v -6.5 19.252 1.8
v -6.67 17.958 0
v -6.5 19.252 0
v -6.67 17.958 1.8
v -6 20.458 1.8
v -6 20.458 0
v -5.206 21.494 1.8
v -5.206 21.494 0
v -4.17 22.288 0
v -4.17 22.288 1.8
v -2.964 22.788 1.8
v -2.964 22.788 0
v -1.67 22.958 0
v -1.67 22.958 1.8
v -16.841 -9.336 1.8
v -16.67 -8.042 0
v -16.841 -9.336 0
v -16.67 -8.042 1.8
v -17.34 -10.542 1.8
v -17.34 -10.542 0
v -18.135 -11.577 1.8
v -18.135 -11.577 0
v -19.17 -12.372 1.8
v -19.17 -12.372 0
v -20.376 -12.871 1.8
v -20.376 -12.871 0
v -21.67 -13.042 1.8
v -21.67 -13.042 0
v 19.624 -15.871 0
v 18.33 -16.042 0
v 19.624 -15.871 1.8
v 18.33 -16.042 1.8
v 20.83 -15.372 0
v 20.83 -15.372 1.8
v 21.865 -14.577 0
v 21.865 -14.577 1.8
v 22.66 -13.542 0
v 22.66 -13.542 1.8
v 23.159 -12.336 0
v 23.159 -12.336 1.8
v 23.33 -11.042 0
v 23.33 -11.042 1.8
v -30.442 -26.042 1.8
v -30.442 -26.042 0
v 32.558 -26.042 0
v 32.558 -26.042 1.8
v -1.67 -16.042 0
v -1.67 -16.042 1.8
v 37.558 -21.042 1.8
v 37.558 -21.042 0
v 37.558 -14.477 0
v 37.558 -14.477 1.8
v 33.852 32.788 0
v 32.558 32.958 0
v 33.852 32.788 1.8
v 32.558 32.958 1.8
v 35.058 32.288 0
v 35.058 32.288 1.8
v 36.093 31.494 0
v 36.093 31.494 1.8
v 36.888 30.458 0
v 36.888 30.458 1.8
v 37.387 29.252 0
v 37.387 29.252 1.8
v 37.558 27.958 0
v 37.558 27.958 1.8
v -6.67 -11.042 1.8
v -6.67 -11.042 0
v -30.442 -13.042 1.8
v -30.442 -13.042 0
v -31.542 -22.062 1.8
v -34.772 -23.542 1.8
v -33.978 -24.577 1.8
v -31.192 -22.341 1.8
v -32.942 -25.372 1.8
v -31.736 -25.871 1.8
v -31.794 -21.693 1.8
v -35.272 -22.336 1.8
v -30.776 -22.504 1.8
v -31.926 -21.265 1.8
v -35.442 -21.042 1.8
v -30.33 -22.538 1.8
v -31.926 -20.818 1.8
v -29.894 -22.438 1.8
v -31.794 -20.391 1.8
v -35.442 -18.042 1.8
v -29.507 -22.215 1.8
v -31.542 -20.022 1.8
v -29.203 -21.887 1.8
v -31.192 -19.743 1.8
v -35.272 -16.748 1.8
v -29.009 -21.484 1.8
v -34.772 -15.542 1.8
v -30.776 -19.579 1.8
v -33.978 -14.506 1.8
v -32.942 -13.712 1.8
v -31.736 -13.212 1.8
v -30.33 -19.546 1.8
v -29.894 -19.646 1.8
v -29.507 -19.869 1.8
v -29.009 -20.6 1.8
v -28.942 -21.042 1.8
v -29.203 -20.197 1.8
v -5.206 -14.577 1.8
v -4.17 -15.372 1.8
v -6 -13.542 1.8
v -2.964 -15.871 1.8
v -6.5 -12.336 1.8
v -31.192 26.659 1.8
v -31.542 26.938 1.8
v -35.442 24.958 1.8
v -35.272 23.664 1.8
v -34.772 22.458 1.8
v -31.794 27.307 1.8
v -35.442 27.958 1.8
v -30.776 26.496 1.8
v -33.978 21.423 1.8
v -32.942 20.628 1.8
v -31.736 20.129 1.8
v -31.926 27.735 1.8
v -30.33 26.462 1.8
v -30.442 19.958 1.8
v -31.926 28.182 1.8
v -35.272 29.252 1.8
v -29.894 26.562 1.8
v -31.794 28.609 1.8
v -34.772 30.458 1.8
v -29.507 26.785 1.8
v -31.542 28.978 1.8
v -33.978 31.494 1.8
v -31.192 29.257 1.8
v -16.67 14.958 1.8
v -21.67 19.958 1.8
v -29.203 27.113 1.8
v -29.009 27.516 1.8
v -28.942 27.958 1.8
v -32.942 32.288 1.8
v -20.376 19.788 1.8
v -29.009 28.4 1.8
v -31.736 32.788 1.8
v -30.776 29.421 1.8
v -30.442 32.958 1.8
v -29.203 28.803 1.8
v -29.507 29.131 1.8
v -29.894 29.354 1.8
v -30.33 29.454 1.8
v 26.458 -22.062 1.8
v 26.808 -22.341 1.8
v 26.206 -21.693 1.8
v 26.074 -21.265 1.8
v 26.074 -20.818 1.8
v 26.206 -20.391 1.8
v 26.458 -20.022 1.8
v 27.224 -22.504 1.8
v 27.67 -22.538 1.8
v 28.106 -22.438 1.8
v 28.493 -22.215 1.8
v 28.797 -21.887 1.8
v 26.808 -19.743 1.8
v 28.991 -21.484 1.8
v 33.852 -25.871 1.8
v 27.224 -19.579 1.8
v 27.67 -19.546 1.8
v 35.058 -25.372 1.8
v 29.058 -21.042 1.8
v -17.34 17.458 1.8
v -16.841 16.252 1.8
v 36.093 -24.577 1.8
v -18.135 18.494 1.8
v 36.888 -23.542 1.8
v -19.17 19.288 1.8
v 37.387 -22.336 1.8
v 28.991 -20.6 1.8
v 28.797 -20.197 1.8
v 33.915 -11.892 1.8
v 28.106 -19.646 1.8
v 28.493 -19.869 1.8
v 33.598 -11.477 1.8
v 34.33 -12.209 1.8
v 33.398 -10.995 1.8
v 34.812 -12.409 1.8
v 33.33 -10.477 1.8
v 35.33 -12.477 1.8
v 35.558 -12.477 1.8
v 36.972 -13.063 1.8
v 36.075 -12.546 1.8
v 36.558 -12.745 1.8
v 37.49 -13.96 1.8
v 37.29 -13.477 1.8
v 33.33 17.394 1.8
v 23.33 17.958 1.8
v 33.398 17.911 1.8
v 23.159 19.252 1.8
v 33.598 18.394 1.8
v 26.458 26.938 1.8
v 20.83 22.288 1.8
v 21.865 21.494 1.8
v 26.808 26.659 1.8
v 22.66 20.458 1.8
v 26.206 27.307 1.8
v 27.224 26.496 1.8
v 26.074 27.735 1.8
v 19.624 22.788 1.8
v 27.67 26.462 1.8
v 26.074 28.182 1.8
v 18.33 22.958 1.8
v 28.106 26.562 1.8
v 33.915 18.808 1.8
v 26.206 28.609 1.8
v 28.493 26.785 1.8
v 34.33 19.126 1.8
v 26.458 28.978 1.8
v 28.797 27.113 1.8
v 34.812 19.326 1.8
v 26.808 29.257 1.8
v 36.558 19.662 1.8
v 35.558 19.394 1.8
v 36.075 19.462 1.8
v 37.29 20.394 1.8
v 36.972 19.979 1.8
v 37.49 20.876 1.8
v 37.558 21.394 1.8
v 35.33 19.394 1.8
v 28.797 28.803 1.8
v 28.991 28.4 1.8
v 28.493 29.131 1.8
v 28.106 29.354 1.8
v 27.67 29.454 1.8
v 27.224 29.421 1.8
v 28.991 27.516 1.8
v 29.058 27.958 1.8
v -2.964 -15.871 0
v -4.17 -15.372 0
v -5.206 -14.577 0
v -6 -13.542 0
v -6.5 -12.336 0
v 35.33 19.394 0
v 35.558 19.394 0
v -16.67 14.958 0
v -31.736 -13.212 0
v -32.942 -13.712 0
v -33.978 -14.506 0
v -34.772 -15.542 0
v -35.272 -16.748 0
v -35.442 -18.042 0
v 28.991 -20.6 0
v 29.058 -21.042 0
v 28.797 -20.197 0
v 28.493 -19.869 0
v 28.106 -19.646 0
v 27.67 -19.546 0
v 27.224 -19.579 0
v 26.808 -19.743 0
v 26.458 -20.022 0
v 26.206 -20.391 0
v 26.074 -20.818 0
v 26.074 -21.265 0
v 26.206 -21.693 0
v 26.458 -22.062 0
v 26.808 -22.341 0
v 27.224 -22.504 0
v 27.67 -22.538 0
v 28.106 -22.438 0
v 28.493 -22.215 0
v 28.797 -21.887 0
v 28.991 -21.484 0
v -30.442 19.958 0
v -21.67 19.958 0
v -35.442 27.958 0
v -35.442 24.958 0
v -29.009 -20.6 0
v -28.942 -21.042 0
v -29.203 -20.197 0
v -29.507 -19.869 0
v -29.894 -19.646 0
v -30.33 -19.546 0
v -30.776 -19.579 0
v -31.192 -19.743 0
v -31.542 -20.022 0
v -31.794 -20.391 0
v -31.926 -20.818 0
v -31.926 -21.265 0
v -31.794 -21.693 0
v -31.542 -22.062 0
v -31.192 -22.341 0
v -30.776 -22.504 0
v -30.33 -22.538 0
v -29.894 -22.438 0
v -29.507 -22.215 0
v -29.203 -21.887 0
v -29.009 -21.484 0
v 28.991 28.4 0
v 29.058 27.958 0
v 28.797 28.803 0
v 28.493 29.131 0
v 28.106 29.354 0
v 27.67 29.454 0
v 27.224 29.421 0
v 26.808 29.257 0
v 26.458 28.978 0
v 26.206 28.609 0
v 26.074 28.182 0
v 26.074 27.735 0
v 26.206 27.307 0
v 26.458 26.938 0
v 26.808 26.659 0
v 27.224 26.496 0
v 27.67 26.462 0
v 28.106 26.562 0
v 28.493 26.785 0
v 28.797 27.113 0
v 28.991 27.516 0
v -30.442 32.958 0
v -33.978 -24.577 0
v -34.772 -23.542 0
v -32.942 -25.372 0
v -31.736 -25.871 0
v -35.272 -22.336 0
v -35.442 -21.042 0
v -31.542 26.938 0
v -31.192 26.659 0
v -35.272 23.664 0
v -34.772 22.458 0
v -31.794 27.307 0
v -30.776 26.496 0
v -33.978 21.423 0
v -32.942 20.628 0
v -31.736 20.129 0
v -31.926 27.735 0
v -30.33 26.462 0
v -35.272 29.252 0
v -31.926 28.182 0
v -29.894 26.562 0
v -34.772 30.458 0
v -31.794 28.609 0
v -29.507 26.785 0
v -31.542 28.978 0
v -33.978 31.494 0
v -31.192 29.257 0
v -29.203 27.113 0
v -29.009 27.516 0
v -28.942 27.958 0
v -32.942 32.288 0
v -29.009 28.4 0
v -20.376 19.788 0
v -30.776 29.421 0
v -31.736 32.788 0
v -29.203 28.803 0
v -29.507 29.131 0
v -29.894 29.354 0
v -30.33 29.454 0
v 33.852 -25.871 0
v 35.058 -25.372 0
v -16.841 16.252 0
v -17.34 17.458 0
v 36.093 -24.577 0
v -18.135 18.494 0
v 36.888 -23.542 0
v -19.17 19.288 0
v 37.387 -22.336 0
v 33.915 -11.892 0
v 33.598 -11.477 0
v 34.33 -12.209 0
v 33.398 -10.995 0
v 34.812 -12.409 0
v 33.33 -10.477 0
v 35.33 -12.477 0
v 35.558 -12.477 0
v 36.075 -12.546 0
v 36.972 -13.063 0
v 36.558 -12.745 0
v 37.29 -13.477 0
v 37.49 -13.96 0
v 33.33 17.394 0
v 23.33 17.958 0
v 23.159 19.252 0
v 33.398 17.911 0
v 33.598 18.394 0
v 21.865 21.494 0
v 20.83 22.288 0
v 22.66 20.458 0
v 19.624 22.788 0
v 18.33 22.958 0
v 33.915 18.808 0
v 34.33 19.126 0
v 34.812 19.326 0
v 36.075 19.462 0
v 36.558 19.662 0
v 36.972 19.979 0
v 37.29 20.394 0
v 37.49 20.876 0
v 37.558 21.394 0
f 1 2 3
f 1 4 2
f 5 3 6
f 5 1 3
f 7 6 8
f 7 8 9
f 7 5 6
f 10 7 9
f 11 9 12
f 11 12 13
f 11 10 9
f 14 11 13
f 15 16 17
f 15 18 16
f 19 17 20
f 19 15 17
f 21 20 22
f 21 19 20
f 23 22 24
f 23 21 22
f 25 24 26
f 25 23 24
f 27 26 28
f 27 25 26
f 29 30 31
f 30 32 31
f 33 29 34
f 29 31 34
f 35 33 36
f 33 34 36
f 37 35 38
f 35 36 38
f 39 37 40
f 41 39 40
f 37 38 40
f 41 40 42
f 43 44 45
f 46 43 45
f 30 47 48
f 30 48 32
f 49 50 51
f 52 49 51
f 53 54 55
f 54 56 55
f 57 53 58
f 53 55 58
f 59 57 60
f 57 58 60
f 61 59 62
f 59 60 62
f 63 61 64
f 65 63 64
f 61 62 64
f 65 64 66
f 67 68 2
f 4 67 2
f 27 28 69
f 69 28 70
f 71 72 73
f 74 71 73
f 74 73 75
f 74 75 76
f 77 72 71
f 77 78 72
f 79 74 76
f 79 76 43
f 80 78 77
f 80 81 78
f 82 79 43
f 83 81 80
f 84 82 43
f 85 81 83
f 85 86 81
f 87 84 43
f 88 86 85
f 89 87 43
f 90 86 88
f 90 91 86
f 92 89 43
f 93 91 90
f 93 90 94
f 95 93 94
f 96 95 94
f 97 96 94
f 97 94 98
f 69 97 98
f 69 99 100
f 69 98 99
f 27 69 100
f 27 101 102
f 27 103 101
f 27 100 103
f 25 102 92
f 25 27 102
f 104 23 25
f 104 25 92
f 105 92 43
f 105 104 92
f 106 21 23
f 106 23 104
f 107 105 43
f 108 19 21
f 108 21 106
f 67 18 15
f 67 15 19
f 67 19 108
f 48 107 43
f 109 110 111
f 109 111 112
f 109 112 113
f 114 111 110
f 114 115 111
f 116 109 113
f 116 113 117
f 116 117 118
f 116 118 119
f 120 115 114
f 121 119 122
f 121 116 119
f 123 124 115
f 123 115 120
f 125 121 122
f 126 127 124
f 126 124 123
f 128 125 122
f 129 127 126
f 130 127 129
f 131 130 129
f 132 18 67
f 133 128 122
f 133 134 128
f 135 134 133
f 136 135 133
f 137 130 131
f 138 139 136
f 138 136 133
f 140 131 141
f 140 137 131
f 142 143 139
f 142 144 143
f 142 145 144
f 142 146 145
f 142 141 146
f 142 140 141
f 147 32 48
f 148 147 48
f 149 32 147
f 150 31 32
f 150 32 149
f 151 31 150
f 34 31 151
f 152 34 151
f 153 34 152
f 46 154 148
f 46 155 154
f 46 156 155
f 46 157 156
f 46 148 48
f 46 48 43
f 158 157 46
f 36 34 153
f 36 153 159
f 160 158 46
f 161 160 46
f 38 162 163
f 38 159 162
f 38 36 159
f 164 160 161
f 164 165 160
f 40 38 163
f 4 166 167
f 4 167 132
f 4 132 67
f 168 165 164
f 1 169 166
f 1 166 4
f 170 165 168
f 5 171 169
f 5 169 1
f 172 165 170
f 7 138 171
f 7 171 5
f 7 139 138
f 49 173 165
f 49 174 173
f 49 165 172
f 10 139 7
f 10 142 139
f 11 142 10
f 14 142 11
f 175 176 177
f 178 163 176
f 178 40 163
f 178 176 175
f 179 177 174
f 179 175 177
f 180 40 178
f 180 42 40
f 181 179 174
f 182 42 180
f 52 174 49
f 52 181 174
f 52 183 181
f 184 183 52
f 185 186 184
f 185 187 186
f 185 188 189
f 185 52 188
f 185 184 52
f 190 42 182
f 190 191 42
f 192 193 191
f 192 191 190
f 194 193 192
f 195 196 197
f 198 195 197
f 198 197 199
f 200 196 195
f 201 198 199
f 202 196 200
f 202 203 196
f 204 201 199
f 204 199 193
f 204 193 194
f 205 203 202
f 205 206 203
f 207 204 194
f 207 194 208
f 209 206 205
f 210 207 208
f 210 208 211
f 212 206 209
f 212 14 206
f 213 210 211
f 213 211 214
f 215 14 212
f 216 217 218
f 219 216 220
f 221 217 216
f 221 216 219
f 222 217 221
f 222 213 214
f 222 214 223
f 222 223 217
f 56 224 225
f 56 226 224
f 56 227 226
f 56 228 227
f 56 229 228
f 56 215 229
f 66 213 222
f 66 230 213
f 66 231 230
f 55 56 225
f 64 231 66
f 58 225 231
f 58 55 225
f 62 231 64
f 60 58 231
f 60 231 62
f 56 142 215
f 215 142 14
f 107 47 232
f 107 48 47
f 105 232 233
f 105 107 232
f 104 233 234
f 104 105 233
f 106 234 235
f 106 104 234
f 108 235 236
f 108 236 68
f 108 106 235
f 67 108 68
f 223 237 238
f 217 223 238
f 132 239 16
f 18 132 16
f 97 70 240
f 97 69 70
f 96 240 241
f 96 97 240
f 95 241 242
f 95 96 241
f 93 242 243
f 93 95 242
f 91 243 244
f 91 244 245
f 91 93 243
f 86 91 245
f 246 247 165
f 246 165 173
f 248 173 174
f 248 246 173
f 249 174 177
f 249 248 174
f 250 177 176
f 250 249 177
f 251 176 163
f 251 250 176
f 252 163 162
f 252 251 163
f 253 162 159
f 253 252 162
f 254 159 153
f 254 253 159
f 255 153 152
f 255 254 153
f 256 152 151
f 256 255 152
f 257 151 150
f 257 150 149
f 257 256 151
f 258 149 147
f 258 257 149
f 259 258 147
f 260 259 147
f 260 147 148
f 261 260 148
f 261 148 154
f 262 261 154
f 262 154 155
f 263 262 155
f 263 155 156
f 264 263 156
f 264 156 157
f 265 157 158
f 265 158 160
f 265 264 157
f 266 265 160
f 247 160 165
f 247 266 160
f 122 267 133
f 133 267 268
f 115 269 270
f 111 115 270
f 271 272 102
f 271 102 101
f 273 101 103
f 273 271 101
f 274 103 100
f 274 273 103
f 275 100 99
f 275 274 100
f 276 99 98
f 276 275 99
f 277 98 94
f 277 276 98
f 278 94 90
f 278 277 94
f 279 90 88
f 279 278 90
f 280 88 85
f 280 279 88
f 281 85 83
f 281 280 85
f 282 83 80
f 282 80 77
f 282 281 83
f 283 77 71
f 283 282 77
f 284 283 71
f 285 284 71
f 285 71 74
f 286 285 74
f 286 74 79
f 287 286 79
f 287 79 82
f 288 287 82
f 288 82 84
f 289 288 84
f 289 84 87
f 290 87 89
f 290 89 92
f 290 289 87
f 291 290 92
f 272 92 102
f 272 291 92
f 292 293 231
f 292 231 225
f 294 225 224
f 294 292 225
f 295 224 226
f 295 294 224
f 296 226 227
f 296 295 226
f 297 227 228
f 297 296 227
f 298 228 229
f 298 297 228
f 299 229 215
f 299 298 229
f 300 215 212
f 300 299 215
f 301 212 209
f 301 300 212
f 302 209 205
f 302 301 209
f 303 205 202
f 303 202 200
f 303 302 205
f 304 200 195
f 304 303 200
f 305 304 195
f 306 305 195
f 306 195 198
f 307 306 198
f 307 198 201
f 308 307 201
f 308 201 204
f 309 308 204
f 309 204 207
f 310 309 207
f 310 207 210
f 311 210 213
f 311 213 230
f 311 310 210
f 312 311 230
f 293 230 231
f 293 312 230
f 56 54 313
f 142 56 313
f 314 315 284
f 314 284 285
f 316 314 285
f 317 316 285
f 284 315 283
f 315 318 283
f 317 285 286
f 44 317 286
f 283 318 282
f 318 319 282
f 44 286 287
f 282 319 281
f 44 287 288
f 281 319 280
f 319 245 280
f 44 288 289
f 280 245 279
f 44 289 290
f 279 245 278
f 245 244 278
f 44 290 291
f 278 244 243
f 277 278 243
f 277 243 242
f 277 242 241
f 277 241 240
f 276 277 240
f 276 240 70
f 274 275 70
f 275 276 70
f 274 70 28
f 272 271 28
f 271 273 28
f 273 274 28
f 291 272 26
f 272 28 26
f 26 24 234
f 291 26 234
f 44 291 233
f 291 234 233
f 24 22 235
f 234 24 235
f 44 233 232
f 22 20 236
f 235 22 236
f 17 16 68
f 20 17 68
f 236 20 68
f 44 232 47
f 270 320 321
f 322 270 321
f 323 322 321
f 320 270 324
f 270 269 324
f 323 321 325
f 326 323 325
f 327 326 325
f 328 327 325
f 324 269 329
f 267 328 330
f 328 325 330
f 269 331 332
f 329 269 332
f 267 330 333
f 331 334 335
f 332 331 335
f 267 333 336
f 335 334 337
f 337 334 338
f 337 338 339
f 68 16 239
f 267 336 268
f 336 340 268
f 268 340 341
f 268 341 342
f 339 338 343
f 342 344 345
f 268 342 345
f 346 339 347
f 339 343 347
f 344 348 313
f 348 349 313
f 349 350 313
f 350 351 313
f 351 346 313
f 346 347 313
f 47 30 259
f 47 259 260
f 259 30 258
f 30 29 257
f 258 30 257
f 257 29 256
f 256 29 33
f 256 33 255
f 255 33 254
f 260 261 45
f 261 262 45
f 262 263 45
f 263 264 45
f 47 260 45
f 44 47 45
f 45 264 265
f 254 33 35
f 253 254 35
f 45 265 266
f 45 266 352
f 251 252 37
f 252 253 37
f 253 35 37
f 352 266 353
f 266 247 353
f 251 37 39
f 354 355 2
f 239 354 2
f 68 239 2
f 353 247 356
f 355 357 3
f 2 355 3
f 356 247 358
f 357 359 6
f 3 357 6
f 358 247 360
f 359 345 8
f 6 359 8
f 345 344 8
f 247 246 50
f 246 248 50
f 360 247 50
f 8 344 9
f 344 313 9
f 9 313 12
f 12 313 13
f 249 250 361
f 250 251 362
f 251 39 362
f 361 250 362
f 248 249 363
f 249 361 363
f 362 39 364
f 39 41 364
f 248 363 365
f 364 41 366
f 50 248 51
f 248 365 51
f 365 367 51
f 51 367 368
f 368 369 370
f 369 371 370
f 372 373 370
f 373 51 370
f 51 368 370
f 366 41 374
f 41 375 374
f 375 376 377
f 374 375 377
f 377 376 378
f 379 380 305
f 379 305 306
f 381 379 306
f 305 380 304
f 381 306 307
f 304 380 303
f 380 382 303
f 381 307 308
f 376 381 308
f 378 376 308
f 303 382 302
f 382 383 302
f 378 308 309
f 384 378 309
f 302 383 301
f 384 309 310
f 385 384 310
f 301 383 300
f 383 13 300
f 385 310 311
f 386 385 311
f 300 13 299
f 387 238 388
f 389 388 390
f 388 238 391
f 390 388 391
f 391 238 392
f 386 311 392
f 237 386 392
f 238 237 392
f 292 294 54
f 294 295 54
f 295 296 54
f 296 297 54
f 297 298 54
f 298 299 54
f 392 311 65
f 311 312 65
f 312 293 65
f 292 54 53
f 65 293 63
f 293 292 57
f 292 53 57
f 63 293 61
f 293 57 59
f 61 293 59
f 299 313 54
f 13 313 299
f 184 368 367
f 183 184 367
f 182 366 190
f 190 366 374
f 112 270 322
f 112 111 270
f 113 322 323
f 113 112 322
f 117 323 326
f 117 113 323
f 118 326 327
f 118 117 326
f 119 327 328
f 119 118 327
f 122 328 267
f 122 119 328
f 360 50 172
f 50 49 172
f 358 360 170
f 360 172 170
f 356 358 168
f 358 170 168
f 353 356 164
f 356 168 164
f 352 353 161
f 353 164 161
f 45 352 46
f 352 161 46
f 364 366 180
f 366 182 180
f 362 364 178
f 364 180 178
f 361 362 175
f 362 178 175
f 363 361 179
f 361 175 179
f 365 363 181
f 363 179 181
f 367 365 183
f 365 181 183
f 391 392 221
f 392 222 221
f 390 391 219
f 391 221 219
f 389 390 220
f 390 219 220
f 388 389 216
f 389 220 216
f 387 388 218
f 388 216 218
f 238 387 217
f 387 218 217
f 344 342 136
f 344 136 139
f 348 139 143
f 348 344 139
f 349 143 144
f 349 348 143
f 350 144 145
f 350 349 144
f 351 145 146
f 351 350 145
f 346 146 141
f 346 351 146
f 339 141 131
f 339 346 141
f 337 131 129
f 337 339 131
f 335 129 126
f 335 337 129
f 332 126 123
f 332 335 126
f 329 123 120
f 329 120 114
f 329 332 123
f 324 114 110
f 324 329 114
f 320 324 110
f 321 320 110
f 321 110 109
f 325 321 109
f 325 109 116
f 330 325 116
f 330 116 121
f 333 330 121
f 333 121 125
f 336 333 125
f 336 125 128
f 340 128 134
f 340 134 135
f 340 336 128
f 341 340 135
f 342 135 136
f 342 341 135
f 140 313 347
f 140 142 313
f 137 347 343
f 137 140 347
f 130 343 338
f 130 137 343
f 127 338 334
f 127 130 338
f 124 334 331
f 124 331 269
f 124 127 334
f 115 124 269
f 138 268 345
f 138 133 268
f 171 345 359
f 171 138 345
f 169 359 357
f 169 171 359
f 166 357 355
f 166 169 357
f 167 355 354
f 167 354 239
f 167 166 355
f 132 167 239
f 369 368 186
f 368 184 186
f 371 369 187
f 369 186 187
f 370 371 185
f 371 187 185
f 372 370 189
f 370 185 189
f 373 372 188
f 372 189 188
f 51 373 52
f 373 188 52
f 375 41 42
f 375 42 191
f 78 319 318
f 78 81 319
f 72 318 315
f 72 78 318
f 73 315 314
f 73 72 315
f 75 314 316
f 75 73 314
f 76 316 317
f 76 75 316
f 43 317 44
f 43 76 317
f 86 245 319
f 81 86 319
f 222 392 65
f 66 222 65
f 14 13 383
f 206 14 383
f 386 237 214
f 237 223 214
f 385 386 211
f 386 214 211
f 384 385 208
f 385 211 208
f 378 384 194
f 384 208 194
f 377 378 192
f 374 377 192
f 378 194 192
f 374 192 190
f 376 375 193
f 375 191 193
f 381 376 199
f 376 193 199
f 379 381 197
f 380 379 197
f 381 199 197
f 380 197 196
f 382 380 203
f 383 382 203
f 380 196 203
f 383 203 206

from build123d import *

# Parameters (mm, degrees)
F2_R     = 1.5
F2_W     = 30
F2_H     = 39
F3_DEPTH = 1.8
F5_R     = 5
F6_R     = 2


with BuildPart() as f3:
    # F2 (on Top) → F3 (new body)
    with BuildSketch(Plane.XY):
        Polygon((37.5577017069, 32.9581392366), (-35.4422982931, 32.9581392366), (-35.4422982931, 19.9581392366), (-16.6703661359, 19.9581392366), (-16.6703661359, -13.0418607634), (-35.4422982931, -13.0418607634), (-35.4422982931, -26.0418607634), (37.5577017069, -26.0418607634), (37.5577017069, -12.4774002814), (33.3296338641, -12.4774002814), (33.3296338641, 19.3936787546), (37.5577017069, 19.3936787546), align=None)
        with Locations((-30.4422982931, -21.0418607634)):
            Circle(F2_R, mode=Mode.SUBTRACT)
        with Locations((27.5577017069, -21.0418607634)):
            Circle(F2_R, mode=Mode.SUBTRACT)
        with Locations((8.3296338641, 3.4581392366)):
            Rectangle(F2_W, F2_H, mode=Mode.SUBTRACT)
        with Locations((-30.4422982931, 27.9581392366)):
            Circle(F2_R, mode=Mode.SUBTRACT)
        with Locations((27.5577017069, 27.9581392366)):
            Circle(F2_R, mode=Mode.SUBTRACT)
    extrude(amount=F3_DEPTH)

    # F5
    f5_edges = [f3.edges().sort_by_distance(p)[0] for p in [
        (-6.670366, 22.958139, 0.9),
        (-6.670366, -16.041861, 0.9),
        (23.329634, -16.041861, 0.9),
        (23.329634, 22.958139, 0.9),
        (-35.442298, -26.041861, 0.9),
        (37.557702, 32.958139, 0.9),
        (-35.442298, 32.958139, 0.9),
        (-16.670366, -13.041861, 0.9),
        (-16.670366, 19.958139, 0.9),
        (-35.442298, 19.958139, 0.9),
        (-35.442298, -13.041861, 0.9),
        (37.557702, -26.041861, 0.9),
    ]]
    fillet(f5_edges, radius=F5_R)

    # F6
    f6_edges = [f3.edges().sort_by_distance(p)[0] for p in [
        (37.557702, 19.393679, 0.9),
        (37.557702, -12.4774, 0.9),
        (33.329634, 19.393679, 0.9),
        (33.329634, -12.4774, 0.9),
    ]]
    fillet(f6_edges, radius=F6_R)


solid = f3.part
